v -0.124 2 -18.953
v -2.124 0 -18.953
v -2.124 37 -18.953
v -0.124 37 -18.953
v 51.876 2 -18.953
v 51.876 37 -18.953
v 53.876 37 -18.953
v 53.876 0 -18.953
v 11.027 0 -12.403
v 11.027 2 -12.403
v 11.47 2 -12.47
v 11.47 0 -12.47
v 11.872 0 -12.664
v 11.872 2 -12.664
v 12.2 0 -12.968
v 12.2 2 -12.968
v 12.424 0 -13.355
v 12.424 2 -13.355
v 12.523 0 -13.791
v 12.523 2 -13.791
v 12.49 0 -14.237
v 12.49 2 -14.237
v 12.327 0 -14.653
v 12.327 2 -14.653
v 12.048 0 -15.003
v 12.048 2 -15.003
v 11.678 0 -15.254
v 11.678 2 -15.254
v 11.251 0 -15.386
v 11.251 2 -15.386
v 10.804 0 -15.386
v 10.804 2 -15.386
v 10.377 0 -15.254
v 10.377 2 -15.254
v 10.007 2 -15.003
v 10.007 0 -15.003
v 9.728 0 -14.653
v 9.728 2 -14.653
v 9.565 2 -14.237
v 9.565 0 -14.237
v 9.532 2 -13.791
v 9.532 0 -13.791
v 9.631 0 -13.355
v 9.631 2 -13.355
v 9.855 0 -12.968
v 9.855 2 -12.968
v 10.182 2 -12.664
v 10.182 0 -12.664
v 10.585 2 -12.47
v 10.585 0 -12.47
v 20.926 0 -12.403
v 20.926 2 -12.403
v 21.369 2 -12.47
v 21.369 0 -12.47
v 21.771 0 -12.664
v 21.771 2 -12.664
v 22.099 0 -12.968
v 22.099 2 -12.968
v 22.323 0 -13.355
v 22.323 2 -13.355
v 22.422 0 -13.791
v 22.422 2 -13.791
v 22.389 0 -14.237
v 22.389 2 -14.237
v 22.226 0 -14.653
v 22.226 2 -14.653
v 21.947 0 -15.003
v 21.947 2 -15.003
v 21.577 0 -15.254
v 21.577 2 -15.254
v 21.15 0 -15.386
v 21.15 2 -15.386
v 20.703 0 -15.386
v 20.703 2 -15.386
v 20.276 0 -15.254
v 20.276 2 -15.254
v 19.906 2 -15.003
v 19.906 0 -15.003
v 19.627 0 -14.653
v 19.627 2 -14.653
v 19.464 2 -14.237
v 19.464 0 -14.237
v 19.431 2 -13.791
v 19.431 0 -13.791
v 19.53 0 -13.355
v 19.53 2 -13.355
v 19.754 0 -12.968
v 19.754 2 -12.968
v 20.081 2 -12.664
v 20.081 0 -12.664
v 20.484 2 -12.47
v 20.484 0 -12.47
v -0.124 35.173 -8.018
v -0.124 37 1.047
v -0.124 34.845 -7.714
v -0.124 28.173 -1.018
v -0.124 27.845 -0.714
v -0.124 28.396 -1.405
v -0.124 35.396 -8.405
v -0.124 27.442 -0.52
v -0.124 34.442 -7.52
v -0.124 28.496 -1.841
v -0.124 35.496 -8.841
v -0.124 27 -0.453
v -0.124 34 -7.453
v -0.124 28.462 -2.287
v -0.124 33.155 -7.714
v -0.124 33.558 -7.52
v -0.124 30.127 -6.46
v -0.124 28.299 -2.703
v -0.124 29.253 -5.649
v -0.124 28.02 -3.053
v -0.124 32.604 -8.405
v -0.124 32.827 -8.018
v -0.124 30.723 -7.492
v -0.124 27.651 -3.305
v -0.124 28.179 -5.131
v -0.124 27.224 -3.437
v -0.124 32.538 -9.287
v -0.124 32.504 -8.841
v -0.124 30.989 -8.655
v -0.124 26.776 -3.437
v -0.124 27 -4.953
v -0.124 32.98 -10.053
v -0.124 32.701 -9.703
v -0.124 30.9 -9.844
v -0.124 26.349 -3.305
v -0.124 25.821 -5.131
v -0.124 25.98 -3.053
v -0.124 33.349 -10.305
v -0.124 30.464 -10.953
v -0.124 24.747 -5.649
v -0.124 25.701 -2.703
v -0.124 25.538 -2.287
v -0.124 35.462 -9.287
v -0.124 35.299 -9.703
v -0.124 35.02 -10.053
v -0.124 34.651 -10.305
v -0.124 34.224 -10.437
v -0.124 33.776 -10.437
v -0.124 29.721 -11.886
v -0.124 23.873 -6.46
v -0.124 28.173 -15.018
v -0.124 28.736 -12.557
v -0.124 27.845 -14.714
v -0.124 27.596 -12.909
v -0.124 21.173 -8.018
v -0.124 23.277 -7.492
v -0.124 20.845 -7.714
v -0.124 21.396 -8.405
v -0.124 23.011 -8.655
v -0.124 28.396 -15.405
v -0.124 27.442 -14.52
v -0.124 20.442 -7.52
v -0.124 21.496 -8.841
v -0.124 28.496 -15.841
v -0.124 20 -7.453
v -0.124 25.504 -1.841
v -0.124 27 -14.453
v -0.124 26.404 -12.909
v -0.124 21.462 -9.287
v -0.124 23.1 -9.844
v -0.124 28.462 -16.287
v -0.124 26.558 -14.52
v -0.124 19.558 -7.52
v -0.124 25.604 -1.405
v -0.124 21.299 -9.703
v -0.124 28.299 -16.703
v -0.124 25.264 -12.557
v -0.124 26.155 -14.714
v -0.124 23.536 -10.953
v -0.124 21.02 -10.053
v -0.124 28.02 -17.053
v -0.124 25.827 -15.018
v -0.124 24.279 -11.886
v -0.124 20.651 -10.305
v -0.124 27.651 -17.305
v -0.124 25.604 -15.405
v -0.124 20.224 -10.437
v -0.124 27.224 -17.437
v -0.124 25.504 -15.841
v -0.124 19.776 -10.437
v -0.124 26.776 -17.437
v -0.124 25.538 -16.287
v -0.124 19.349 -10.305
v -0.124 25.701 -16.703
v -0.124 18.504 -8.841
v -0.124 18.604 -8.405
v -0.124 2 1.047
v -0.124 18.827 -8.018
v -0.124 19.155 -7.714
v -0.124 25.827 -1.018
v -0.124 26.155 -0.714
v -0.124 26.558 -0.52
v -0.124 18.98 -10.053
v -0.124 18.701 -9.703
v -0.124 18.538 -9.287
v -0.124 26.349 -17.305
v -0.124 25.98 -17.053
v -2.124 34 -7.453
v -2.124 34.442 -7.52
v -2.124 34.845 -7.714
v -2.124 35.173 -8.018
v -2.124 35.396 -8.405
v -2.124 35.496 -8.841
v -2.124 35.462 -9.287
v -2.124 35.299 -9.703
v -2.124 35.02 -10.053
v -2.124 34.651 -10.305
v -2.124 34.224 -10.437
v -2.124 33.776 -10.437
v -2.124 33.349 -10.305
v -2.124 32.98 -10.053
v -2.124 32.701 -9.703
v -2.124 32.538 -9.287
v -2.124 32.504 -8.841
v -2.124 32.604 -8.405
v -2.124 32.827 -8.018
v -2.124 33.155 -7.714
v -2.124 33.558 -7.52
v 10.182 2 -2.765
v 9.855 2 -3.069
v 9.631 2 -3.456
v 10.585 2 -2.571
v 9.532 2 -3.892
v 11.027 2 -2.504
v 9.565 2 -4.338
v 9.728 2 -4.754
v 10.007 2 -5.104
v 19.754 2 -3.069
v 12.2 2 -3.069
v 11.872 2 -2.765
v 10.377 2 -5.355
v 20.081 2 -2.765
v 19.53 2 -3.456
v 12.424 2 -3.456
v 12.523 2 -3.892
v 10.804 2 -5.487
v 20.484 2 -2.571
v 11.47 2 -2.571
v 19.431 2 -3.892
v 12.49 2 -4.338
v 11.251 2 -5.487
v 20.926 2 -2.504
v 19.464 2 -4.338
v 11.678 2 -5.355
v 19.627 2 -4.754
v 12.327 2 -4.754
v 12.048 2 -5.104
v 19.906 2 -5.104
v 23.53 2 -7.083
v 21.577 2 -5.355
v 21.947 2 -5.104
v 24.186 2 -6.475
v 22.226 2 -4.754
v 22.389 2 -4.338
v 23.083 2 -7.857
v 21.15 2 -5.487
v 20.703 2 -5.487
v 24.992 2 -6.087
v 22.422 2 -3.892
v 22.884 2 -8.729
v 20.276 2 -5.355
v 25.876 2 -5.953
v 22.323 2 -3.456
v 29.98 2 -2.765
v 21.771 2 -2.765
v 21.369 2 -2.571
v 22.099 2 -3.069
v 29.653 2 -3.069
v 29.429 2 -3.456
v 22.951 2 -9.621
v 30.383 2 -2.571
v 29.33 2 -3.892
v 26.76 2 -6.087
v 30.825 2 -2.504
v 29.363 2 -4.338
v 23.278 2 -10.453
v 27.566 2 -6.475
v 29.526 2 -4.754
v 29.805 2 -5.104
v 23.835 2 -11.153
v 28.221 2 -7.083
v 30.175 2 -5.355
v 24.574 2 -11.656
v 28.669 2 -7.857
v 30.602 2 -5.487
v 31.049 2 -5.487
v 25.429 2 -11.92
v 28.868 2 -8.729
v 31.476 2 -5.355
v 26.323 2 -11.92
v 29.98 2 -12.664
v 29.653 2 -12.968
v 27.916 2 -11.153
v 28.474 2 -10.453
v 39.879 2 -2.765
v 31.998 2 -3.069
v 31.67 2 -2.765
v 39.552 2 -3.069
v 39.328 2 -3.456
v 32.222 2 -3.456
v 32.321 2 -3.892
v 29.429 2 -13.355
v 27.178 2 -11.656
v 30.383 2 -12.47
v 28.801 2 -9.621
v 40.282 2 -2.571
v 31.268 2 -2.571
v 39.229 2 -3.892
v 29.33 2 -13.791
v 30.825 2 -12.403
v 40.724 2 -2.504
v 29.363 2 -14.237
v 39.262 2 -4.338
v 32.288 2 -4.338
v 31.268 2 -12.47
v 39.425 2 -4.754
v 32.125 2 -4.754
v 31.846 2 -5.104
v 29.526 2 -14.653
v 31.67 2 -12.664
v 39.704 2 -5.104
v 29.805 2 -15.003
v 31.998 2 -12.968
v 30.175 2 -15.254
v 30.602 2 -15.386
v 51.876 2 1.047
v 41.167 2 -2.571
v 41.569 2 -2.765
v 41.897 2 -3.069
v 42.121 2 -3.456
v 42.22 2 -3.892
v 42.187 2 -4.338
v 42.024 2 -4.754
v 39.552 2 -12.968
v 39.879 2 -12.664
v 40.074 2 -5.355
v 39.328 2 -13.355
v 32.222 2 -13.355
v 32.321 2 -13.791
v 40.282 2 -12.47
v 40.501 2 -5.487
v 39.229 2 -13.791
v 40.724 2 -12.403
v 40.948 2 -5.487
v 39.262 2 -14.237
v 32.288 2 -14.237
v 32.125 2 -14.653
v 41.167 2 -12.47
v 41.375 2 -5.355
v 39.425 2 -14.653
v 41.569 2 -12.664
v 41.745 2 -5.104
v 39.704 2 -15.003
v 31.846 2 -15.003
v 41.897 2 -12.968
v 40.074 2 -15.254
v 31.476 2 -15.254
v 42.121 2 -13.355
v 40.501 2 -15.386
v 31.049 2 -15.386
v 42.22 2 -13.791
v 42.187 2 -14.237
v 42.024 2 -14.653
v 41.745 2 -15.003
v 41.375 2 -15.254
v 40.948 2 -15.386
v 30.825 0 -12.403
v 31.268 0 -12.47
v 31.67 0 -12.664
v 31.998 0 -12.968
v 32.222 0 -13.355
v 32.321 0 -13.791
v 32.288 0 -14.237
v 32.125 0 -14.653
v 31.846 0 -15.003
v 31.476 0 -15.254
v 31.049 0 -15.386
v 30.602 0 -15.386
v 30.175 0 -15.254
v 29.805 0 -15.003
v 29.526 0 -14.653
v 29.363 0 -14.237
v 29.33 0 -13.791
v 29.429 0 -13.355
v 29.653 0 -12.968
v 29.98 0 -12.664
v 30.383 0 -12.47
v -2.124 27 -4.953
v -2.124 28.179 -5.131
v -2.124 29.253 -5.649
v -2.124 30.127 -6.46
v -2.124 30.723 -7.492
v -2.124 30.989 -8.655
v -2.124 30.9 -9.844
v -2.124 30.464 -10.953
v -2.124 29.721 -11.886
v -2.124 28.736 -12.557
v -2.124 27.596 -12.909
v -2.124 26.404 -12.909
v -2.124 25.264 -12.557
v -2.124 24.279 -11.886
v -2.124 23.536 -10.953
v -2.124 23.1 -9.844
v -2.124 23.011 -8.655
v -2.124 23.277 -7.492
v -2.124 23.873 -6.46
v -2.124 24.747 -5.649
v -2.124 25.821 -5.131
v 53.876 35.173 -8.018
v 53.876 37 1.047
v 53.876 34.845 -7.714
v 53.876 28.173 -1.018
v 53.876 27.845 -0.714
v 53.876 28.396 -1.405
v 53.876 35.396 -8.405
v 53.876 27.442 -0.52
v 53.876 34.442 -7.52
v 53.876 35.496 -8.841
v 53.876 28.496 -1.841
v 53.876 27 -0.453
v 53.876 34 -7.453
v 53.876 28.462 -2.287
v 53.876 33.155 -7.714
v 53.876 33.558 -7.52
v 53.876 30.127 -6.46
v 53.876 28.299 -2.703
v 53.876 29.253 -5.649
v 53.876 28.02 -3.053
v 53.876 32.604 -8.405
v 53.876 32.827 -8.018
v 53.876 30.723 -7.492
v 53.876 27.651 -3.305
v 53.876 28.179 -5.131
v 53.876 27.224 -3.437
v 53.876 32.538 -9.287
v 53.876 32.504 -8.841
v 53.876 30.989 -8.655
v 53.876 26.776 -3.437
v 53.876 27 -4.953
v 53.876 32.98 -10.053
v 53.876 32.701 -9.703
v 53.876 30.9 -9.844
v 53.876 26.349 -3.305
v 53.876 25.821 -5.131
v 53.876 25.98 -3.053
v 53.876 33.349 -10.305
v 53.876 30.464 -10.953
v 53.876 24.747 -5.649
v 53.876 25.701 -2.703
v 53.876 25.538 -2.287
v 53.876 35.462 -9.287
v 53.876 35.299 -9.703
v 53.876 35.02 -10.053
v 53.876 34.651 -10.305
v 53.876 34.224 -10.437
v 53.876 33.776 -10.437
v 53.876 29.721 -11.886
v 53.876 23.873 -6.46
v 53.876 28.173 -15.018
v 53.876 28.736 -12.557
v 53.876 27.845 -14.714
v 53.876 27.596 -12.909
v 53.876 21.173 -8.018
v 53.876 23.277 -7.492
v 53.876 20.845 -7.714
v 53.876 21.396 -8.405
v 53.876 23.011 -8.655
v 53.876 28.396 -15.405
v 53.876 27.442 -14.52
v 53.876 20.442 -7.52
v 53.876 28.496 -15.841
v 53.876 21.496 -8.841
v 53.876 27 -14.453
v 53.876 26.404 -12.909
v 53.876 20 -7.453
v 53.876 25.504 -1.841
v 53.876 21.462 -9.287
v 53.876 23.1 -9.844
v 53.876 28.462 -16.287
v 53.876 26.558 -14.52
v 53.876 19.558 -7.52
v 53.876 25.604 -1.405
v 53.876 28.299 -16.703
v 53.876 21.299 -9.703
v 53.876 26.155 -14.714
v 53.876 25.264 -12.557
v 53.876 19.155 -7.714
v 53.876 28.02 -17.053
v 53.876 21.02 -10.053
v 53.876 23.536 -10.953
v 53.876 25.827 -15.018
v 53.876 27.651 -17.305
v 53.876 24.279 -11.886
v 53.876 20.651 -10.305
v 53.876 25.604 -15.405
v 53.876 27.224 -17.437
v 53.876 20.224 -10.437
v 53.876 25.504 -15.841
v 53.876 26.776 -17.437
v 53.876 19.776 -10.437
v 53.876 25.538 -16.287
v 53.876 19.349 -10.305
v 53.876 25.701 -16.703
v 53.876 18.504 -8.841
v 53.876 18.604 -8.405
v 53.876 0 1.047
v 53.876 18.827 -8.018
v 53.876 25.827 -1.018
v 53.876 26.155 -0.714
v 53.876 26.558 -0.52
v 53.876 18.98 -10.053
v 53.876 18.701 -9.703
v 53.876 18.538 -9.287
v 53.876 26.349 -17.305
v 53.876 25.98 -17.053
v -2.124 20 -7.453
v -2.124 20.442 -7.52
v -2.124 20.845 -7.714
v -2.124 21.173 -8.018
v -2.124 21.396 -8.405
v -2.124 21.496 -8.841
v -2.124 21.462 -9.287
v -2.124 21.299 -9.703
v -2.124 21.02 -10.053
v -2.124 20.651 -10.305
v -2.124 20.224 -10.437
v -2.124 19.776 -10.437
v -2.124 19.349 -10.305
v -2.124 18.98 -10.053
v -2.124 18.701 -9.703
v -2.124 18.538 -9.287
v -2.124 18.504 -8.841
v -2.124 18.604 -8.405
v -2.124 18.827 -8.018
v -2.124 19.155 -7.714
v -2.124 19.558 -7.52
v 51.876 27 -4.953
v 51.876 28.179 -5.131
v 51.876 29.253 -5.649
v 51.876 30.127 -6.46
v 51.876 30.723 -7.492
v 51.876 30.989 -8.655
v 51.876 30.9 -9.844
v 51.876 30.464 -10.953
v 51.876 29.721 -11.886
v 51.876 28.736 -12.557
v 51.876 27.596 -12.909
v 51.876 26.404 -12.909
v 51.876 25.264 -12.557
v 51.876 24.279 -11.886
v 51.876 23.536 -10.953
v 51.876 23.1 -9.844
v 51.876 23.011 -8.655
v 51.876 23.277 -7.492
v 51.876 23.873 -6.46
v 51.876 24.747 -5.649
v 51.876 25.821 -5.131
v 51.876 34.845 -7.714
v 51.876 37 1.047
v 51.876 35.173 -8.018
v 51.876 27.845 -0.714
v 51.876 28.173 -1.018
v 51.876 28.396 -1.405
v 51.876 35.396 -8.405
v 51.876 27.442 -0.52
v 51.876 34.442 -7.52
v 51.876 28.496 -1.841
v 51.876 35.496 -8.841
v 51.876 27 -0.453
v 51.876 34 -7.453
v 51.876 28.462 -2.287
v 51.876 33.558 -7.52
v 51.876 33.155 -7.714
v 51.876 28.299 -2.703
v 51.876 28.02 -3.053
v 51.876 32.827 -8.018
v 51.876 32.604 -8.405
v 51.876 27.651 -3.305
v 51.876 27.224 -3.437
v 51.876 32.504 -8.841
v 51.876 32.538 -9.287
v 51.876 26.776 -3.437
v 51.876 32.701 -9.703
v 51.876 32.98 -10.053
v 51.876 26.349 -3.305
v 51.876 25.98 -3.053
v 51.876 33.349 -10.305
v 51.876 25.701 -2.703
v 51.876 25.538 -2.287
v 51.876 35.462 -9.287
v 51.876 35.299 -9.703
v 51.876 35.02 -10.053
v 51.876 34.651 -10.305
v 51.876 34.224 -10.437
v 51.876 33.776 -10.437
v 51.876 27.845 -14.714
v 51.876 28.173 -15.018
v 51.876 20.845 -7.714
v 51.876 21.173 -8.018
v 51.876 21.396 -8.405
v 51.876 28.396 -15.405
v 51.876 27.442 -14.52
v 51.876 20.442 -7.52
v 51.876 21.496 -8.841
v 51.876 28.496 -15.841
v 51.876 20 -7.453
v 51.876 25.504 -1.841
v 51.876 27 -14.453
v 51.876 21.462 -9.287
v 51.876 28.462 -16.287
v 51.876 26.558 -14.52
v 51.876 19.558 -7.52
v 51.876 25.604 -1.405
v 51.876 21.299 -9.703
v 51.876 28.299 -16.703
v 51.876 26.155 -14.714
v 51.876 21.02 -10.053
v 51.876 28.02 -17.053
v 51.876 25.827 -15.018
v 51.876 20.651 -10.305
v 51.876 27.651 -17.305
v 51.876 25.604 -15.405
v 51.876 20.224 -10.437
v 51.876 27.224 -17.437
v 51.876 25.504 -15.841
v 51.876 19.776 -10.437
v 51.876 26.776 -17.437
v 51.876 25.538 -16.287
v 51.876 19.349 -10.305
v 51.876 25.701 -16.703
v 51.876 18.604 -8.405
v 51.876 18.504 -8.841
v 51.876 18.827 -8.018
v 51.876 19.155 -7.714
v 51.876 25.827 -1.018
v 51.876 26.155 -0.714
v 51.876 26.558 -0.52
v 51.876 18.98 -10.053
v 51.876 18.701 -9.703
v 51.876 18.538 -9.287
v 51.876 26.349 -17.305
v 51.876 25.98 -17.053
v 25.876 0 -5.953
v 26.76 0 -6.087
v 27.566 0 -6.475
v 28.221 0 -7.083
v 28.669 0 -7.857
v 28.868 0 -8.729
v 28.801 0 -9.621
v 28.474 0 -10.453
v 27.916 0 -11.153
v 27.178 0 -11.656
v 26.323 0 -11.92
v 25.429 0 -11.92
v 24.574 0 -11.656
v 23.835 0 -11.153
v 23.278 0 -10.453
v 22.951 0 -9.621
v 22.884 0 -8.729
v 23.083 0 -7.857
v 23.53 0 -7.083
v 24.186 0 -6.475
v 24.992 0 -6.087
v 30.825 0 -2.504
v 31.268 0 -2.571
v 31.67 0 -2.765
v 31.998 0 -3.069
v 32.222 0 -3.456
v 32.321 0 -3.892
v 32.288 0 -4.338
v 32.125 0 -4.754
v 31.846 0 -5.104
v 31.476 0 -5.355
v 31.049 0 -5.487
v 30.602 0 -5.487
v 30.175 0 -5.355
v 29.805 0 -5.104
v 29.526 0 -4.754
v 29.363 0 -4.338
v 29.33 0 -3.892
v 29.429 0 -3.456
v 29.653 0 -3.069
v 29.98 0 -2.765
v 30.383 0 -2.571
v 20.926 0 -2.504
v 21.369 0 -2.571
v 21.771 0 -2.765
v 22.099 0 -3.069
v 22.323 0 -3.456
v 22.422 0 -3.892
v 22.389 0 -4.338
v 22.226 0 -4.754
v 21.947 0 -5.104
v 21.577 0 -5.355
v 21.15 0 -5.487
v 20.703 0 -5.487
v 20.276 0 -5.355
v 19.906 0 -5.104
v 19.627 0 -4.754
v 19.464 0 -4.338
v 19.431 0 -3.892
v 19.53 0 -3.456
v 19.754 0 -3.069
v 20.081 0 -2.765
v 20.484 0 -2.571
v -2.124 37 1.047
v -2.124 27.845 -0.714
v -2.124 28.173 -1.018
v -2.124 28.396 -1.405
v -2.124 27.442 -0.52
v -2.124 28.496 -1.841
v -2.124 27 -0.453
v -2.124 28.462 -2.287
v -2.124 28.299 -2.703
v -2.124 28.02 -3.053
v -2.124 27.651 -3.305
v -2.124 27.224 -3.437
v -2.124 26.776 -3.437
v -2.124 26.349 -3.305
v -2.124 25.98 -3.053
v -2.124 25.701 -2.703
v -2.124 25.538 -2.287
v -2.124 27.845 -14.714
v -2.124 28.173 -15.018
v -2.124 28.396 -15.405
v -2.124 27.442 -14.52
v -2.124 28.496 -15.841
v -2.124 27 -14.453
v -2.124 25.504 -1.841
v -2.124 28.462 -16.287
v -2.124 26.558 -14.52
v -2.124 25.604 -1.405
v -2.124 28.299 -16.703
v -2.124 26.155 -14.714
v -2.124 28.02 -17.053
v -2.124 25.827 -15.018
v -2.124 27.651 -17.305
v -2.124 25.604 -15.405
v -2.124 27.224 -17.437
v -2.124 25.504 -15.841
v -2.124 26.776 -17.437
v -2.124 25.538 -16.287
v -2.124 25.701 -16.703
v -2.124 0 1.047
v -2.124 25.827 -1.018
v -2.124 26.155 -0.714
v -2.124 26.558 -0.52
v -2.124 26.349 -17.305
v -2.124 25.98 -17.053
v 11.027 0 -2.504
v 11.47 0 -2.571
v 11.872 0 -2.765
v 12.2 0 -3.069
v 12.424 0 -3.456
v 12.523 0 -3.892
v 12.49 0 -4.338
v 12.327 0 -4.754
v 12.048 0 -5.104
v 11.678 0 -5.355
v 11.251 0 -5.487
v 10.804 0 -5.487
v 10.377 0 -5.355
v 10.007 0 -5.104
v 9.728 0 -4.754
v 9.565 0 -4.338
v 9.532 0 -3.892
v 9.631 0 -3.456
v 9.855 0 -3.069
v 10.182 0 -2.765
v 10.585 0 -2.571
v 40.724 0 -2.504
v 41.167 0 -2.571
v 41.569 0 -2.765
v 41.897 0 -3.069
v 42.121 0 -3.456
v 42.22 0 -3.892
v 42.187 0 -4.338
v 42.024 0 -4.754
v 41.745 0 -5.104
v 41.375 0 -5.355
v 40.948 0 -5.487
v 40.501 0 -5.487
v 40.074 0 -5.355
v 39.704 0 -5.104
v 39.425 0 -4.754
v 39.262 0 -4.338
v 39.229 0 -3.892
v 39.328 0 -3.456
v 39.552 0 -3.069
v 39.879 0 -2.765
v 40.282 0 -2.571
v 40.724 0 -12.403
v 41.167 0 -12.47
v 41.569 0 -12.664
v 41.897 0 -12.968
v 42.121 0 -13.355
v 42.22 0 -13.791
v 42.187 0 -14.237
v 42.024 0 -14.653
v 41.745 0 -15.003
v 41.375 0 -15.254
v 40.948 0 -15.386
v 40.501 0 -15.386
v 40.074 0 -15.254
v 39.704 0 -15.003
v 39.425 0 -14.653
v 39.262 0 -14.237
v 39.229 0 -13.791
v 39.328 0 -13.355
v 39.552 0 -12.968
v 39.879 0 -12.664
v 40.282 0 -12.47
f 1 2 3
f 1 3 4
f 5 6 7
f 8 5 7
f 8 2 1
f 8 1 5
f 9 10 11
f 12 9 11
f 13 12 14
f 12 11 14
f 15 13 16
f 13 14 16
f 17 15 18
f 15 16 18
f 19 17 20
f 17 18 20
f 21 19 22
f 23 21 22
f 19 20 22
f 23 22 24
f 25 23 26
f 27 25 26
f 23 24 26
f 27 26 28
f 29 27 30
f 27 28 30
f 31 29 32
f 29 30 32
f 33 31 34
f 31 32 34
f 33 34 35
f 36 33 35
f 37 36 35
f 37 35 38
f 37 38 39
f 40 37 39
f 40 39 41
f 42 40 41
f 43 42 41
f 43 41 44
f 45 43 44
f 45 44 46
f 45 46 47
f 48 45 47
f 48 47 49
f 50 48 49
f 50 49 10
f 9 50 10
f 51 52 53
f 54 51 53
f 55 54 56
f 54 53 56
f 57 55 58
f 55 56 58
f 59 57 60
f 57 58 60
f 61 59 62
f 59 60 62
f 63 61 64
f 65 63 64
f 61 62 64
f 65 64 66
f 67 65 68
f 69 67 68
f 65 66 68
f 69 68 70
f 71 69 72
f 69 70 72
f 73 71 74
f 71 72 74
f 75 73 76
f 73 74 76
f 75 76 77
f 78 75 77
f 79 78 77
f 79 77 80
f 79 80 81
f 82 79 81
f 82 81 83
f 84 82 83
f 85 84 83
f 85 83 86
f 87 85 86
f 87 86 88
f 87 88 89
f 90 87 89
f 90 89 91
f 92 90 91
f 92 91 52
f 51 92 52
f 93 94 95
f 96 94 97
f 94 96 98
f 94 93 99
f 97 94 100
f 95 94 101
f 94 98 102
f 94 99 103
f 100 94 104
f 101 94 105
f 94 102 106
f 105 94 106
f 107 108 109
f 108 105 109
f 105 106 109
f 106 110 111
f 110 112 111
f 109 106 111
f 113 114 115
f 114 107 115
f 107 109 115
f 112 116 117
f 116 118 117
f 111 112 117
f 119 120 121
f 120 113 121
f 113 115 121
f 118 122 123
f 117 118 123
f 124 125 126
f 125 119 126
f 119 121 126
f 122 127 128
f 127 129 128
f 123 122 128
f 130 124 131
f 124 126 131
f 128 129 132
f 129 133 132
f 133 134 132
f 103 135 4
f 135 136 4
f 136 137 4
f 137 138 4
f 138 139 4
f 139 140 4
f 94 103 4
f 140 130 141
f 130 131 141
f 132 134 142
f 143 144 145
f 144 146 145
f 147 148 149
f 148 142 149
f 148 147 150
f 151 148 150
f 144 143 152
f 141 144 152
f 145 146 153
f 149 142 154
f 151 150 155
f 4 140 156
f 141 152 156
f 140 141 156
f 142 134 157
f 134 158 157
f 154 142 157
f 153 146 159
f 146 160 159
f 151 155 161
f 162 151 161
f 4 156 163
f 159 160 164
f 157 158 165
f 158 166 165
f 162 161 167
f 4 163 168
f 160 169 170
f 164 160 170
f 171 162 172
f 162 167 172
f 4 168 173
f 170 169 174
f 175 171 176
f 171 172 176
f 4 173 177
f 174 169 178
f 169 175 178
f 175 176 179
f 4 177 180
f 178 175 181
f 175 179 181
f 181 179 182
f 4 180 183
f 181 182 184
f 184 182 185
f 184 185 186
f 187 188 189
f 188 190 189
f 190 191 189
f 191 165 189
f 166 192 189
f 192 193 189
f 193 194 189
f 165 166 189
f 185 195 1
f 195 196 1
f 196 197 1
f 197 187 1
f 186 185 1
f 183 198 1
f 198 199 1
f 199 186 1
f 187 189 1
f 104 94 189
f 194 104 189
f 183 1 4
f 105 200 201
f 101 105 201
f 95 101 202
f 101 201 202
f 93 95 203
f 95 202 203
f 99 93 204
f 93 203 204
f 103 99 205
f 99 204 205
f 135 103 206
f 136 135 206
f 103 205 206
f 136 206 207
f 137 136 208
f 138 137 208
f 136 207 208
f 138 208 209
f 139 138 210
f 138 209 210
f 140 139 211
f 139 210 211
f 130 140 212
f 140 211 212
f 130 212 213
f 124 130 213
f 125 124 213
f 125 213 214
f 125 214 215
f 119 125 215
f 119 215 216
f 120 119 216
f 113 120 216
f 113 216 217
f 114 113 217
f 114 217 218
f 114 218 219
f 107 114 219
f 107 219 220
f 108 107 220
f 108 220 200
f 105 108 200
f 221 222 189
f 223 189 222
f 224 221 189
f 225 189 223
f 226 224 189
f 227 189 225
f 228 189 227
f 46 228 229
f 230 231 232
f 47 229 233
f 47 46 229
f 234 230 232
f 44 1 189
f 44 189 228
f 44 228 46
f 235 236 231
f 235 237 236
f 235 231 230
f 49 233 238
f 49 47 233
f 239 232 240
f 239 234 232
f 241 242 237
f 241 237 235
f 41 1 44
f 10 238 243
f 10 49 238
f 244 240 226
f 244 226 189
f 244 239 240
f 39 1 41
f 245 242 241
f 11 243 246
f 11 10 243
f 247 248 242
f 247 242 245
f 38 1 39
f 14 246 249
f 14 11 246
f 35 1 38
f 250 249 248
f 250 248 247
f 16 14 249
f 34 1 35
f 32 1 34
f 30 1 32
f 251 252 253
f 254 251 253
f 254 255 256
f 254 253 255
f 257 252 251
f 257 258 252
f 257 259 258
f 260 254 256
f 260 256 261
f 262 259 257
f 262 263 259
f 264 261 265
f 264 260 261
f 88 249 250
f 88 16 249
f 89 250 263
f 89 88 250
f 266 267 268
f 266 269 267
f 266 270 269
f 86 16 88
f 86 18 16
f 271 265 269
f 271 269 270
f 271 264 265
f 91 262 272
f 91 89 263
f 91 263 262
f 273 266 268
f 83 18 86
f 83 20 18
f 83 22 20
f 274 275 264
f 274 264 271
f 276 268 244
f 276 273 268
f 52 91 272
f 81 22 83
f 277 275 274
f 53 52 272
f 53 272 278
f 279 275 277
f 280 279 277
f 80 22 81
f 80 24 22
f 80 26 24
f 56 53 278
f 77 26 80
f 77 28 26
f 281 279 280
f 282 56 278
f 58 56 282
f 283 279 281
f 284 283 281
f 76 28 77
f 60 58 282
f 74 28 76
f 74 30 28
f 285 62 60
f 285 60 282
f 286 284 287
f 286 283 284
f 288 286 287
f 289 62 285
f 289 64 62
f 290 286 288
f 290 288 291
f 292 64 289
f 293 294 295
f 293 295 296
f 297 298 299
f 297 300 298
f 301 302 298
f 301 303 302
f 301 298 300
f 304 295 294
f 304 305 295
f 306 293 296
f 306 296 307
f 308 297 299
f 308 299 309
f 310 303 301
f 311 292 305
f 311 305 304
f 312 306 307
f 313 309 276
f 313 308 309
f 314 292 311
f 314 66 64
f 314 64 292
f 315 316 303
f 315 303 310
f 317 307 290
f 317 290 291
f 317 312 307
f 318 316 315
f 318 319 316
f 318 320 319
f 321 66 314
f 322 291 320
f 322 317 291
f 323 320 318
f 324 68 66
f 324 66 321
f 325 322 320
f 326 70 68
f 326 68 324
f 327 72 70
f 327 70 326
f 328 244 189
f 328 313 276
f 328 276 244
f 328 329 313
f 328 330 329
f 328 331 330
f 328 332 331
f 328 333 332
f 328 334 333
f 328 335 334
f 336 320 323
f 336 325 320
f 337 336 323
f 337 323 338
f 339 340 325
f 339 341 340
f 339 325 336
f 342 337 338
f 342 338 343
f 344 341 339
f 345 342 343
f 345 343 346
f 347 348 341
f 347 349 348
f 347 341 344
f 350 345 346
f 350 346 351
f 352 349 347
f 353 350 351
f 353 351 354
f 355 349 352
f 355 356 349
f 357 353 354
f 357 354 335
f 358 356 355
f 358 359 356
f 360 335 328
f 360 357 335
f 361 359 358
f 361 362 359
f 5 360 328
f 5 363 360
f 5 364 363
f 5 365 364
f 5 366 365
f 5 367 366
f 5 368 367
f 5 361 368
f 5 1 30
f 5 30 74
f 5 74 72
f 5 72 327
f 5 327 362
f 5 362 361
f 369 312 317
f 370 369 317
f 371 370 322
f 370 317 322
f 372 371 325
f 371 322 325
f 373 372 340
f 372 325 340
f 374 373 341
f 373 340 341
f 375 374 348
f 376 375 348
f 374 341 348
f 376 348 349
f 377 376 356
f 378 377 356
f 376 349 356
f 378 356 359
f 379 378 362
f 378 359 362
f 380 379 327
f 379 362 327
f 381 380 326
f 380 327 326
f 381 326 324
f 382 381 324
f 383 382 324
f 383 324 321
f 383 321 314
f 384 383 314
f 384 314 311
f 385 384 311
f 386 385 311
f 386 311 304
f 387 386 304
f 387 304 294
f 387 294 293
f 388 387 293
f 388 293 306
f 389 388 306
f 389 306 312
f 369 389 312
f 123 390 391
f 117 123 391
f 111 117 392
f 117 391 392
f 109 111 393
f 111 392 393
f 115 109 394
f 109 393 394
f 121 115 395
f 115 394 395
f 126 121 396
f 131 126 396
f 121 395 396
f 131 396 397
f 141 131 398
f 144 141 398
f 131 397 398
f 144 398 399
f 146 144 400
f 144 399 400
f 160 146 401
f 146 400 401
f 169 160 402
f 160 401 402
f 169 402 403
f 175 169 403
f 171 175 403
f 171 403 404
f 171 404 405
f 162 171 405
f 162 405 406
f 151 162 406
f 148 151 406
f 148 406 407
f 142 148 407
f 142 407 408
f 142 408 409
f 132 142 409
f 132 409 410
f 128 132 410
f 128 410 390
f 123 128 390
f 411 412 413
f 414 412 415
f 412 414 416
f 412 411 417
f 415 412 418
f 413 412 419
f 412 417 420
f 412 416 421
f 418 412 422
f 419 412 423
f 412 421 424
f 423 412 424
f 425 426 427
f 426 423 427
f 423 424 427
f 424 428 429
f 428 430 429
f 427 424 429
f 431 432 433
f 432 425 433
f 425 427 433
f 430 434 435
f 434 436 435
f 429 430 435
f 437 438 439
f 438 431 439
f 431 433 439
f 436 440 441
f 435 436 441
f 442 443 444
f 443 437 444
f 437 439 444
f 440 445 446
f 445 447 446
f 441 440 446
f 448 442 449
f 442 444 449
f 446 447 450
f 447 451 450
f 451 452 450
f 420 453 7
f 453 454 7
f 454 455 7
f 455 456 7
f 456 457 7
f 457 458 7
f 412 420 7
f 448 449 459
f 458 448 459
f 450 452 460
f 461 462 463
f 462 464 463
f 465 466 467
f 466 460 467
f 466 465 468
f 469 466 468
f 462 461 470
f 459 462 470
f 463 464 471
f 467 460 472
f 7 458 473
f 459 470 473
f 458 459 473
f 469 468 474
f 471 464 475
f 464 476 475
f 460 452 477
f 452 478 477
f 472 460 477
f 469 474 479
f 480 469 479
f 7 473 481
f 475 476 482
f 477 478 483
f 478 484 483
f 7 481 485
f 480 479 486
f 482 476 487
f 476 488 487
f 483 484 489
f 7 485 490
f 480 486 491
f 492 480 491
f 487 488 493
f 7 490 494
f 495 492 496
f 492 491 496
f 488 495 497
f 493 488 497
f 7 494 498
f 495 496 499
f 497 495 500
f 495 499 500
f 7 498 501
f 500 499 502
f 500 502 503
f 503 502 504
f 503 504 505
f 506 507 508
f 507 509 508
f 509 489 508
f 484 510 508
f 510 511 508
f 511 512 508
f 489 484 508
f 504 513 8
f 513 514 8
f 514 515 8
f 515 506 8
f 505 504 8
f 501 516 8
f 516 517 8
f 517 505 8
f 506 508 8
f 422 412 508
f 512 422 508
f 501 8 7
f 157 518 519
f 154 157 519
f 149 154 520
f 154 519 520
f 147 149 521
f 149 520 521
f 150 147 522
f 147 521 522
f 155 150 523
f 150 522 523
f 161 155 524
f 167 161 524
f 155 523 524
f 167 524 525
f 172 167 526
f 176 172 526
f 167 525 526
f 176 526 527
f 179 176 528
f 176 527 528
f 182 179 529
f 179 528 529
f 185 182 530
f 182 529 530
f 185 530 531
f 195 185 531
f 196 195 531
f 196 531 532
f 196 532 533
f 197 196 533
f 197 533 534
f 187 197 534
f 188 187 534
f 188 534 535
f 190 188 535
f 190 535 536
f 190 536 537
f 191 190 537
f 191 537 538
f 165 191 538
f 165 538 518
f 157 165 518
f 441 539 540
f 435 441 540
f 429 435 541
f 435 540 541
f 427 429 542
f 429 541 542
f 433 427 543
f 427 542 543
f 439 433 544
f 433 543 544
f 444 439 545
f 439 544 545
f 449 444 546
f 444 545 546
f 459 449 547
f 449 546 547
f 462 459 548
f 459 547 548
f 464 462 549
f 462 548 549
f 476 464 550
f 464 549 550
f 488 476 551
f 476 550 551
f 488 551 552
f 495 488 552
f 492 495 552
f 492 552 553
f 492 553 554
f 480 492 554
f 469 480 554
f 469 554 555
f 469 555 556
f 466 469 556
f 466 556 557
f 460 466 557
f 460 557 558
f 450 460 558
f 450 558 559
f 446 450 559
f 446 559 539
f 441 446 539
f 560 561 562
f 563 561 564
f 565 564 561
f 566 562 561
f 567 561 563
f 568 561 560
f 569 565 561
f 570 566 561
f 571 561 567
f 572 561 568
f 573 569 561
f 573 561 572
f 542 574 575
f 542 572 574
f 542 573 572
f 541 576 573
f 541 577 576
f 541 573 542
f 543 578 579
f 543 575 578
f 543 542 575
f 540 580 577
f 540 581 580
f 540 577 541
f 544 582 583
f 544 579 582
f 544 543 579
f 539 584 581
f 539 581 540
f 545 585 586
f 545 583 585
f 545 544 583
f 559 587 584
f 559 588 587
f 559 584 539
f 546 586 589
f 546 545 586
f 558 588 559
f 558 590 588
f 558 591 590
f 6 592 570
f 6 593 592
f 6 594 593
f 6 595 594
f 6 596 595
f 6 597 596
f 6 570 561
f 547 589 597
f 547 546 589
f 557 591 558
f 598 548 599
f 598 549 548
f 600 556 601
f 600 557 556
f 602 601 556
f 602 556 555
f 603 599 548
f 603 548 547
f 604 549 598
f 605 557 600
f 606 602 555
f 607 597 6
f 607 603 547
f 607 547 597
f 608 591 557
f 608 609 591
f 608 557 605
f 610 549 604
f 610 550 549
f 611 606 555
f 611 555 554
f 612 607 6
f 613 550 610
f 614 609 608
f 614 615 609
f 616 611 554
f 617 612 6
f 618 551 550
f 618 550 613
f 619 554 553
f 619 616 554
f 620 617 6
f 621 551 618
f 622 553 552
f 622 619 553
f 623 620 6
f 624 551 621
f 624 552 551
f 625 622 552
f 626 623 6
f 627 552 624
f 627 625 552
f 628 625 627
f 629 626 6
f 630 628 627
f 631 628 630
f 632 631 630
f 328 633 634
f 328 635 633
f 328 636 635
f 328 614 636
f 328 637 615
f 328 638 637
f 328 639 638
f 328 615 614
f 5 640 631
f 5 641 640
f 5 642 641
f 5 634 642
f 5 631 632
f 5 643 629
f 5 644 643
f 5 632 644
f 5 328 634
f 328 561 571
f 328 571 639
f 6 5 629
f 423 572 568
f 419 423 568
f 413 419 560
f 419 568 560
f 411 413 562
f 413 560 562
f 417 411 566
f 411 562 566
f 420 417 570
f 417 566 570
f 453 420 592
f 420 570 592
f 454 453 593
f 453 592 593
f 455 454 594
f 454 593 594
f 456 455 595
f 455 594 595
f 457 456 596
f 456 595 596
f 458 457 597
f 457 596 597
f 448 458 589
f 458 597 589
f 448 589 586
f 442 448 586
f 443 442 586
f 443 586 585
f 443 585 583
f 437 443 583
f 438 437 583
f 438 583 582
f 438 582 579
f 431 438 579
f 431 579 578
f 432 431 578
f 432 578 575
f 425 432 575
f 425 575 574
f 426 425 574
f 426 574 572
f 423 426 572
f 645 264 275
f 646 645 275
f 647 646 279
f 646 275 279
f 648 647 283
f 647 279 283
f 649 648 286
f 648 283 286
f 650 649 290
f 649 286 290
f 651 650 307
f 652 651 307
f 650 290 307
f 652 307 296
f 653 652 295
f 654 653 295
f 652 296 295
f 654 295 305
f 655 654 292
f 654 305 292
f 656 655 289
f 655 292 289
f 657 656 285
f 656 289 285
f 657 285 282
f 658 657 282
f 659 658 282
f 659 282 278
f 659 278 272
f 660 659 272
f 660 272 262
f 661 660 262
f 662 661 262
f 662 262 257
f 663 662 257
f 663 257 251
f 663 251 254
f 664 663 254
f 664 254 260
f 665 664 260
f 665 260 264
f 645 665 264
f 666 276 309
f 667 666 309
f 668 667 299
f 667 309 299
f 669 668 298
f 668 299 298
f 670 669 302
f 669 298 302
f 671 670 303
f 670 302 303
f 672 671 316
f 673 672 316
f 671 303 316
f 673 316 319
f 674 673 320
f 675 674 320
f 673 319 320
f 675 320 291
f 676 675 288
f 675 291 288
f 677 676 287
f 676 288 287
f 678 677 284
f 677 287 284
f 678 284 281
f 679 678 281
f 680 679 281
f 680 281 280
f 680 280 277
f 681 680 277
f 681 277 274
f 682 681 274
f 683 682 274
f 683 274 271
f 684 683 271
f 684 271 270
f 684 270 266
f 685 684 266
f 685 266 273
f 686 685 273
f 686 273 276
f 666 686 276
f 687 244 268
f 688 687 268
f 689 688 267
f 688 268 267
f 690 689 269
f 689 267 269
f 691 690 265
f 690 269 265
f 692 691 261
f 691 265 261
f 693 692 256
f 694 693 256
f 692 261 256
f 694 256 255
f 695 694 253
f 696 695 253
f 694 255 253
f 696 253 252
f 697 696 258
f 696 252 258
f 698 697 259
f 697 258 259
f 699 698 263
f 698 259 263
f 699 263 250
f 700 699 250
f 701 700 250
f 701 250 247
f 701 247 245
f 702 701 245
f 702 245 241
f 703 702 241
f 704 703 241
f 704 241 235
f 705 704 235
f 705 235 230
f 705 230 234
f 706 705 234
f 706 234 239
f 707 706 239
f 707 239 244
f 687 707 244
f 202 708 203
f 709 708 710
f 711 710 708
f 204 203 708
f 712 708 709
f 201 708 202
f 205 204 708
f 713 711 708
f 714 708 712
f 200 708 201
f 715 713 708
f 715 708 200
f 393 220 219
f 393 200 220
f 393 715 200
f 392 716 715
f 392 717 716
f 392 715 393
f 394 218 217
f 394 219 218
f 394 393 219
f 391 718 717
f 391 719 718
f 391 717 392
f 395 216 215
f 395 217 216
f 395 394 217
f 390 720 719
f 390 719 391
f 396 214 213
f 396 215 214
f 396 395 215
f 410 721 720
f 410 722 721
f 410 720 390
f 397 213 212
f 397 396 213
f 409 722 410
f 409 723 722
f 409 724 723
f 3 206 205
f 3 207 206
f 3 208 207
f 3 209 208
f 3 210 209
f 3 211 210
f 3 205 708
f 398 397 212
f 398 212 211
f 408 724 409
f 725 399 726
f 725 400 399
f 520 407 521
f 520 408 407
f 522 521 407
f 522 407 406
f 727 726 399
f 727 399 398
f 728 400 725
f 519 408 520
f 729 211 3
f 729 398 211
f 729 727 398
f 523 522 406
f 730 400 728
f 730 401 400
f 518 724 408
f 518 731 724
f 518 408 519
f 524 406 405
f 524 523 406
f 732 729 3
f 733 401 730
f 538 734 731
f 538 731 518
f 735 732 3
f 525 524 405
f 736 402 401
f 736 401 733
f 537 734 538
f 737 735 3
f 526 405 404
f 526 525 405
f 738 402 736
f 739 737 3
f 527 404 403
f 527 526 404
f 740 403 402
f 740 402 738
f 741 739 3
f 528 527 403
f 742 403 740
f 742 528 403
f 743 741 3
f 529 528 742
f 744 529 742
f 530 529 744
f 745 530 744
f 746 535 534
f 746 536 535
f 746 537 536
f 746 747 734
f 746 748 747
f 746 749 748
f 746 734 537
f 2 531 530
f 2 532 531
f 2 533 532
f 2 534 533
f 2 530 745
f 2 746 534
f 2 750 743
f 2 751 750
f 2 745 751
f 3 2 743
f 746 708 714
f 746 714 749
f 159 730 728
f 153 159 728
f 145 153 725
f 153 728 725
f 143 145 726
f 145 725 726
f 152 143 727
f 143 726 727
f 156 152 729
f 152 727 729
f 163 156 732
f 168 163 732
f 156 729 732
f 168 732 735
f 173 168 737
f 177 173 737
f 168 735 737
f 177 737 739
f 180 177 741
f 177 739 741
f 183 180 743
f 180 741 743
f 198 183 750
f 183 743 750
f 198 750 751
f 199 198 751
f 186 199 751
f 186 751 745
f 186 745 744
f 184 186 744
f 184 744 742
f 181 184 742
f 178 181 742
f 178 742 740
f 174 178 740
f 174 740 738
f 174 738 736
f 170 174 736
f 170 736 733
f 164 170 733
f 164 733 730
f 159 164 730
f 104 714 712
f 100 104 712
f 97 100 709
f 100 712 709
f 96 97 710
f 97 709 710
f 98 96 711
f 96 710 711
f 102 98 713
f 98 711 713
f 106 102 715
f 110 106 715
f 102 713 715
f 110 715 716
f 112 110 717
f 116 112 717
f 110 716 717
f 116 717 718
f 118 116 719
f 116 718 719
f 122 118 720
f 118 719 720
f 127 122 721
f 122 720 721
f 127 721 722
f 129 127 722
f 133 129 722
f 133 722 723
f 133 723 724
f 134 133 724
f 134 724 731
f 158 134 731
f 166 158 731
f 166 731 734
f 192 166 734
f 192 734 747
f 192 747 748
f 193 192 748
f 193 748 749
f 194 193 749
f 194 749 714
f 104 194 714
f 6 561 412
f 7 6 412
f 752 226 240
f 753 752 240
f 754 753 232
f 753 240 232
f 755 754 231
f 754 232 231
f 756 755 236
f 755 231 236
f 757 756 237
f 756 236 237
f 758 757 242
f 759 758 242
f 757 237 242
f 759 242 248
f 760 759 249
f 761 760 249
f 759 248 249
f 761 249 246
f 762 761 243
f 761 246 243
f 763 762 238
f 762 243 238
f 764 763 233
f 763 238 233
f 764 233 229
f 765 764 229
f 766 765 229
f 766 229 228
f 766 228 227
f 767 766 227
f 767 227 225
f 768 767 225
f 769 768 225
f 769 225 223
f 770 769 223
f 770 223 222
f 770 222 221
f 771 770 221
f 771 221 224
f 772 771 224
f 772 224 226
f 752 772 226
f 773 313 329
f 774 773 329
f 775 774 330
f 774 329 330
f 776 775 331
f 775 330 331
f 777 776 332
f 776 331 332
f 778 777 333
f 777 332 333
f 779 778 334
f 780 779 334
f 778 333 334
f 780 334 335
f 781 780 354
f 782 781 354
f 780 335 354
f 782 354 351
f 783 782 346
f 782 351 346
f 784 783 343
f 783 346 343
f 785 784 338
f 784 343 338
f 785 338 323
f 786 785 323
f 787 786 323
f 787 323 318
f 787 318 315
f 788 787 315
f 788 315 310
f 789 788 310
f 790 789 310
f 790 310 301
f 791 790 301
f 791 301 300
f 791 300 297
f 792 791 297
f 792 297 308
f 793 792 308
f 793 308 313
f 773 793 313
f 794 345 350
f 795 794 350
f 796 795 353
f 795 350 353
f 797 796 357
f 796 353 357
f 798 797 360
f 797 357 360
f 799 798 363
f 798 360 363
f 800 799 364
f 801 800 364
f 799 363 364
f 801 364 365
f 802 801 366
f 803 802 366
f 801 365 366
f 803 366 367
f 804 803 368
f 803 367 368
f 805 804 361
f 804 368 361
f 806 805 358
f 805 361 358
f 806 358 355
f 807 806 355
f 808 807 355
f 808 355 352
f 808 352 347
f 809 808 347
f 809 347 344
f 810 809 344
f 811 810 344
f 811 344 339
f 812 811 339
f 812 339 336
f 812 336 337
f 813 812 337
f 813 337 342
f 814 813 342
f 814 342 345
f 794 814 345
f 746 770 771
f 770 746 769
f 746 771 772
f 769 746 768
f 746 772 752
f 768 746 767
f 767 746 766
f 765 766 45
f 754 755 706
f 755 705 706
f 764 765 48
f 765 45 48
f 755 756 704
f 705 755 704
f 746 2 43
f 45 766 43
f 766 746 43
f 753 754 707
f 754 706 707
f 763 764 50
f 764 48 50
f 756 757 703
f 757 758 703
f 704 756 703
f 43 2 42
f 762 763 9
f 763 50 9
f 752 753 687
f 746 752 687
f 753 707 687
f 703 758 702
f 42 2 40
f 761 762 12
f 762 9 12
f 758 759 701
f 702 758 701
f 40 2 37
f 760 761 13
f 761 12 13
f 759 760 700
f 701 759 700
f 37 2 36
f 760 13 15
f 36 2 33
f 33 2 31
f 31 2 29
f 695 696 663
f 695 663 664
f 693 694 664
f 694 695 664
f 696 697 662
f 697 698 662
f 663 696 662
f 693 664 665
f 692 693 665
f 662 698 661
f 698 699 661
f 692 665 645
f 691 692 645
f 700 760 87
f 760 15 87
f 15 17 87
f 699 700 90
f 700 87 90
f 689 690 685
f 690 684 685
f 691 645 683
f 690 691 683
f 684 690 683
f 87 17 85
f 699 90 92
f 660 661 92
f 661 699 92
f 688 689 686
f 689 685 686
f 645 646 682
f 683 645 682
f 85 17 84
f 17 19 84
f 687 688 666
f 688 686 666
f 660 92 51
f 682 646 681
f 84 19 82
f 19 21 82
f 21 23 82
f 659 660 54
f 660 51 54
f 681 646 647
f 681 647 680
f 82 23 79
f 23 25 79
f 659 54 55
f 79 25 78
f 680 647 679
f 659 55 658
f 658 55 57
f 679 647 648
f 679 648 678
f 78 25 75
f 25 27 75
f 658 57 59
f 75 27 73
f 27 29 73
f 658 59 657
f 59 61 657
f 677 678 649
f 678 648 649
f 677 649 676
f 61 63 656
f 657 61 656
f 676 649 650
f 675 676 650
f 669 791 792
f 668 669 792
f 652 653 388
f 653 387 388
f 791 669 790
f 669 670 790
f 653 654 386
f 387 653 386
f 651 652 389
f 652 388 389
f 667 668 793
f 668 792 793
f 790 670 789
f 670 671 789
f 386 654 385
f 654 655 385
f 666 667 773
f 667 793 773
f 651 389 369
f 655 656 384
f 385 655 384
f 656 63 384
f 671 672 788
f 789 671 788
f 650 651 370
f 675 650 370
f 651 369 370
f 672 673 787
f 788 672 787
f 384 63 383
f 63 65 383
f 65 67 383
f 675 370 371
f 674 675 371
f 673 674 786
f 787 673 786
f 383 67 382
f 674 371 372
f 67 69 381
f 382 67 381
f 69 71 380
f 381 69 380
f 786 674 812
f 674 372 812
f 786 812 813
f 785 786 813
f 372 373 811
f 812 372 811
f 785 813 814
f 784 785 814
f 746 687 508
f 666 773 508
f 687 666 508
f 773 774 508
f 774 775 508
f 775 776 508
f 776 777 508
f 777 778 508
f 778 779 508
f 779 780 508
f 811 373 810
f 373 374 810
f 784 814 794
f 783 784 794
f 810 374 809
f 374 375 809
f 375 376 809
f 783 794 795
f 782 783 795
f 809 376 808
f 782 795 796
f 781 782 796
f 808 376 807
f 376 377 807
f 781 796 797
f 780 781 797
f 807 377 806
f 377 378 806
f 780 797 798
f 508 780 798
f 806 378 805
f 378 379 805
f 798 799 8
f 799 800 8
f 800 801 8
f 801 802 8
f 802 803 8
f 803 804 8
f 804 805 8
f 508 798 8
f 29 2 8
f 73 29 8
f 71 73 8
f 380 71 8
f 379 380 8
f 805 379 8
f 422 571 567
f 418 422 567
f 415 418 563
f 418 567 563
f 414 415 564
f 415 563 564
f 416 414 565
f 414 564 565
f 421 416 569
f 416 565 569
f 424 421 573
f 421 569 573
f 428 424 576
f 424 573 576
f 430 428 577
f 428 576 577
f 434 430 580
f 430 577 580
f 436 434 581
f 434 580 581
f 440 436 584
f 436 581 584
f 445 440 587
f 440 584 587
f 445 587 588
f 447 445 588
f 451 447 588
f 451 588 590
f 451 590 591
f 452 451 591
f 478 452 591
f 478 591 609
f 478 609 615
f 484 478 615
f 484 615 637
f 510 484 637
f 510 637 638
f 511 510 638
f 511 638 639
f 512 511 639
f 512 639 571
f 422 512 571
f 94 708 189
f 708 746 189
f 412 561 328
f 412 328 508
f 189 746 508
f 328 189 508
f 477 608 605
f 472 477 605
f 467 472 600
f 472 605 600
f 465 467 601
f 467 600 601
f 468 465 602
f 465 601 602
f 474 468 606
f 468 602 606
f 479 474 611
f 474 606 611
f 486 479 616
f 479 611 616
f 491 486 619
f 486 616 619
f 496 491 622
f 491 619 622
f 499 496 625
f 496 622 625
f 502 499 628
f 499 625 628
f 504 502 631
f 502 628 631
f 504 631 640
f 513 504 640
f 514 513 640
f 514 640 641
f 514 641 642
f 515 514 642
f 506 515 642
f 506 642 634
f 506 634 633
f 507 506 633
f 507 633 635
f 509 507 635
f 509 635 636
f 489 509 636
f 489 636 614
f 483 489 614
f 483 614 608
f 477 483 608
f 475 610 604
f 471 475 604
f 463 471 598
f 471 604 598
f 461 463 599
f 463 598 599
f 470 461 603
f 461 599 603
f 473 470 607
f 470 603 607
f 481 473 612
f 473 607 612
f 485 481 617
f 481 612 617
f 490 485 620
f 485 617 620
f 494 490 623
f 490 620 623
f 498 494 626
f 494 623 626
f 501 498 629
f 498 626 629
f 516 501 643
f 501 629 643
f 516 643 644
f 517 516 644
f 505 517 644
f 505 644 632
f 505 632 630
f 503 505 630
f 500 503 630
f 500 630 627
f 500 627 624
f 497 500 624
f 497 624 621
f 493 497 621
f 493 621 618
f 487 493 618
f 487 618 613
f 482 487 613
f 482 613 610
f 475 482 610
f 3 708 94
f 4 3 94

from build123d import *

# Parameters (mm, degrees)
SKETCH1_W           = 56
SKETCH1_H           = 20
BOSS_EXTRUDE1_DEPTH = 2
SKETCH2_W           = 2
SKETCH2_H           = 20
BOSS_EXTRUDE2_DEPTH = 35
SKETCH3_R           = 4
SKETCH3_R_2         = 1.5
CUT_EXTRUDE1_DEPTH  = 70.744065851
SKETCH4_R           = 1.5
SKETCH4_R_2         = 3
CUT_EXTRUDE2_DEPTH  = 67.983988806


with BuildPart() as part:
    # Sketch1 → Boss-Extrude1 (new body)
    with BuildSketch(Plane(origin=(0, 0, 0), x_dir=(1, 0, 0), z_dir=(0, 1, 0))):
        with Locations((25.875968992, 8.953488372)):
            Rectangle(SKETCH1_W, SKETCH1_H)
    extrude(amount=BOSS_EXTRUDE1_DEPTH)

    # Sketch2 → Boss-Extrude2 (add)
    with BuildSketch(Plane(origin=(0, 2, 0), x_dir=(1, 0, 0), z_dir=(0, 1, 0))):
        with Locations((-1.124031008, 8.953488372)):
            Rectangle(SKETCH2_W, SKETCH2_H)
        with Locations((52.875968992, 8.953488372)):
            Rectangle(SKETCH2_W, SKETCH2_H)
    extrude(amount=BOSS_EXTRUDE2_DEPTH)

    # Sketch3 → Cut-Extrude1 (cut, through all)
    with BuildSketch(Plane.ZY.offset(2.124031008)):
        with Locations((-8.953488372, 27)):
            Circle(SKETCH3_R)
        with Locations((-15.953488372, 27)):
            Circle(SKETCH3_R_2)
        with Locations((-1.953488372, 27)):
            Circle(SKETCH3_R_2)
        with Locations((-8.953488372, 34)):
            Circle(SKETCH3_R_2)
        with Locations((-8.953488372, 20)):
            Circle(SKETCH3_R_2)
    extrude(amount=-CUT_EXTRUDE1_DEPTH, mode=Mode.SUBTRACT)

    # Sketch4 → Cut-Extrude2 (cut, through all)
    with BuildSketch(Plane(origin=(0, 2, 0), x_dir=(1, 0, 0), z_dir=(0, 1, 0))):
        with Locations(Location((30.825468992, 4.003988372, 0), (0, 0, 270))):
            Circle(SKETCH4_R)
        with Locations(Location((20.926468992, 4.003988372, 0), (0, 0, 270))):
            Circle(SKETCH4_R)
        with Locations(Location((30.825468992, 13.902988372, 0), (0, 0, 270))):
            Circle(SKETCH4_R)
        with Locations(Location((20.926468992, 13.902988372, 0), (0, 0, 270))):
            Circle(SKETCH4_R)
        with Locations(Location((25.875968992, 8.953488372, 0), (0, 0, 270))):
            Circle(SKETCH4_R_2)
        with Locations(Location((40.724468992, 4.003988372, 0), (0, 0, 270))):
            Circle(SKETCH4_R)
        with Locations(Location((40.724468992, 13.902988372, 0), (0, 0, 270))):
            Circle(SKETCH4_R)
        with Locations(Location((11.027468992, 13.902988372, 0), (0, 0, 270))):
            Circle(SKETCH4_R)
        with Locations(Location((11.027468992, 4.003988372, 0), (0, 0, 270))):
            Circle(SKETCH4_R)
    extrude(amount=-CUT_EXTRUDE2_DEPTH, mode=Mode.SUBTRACT)


solid = part.part
